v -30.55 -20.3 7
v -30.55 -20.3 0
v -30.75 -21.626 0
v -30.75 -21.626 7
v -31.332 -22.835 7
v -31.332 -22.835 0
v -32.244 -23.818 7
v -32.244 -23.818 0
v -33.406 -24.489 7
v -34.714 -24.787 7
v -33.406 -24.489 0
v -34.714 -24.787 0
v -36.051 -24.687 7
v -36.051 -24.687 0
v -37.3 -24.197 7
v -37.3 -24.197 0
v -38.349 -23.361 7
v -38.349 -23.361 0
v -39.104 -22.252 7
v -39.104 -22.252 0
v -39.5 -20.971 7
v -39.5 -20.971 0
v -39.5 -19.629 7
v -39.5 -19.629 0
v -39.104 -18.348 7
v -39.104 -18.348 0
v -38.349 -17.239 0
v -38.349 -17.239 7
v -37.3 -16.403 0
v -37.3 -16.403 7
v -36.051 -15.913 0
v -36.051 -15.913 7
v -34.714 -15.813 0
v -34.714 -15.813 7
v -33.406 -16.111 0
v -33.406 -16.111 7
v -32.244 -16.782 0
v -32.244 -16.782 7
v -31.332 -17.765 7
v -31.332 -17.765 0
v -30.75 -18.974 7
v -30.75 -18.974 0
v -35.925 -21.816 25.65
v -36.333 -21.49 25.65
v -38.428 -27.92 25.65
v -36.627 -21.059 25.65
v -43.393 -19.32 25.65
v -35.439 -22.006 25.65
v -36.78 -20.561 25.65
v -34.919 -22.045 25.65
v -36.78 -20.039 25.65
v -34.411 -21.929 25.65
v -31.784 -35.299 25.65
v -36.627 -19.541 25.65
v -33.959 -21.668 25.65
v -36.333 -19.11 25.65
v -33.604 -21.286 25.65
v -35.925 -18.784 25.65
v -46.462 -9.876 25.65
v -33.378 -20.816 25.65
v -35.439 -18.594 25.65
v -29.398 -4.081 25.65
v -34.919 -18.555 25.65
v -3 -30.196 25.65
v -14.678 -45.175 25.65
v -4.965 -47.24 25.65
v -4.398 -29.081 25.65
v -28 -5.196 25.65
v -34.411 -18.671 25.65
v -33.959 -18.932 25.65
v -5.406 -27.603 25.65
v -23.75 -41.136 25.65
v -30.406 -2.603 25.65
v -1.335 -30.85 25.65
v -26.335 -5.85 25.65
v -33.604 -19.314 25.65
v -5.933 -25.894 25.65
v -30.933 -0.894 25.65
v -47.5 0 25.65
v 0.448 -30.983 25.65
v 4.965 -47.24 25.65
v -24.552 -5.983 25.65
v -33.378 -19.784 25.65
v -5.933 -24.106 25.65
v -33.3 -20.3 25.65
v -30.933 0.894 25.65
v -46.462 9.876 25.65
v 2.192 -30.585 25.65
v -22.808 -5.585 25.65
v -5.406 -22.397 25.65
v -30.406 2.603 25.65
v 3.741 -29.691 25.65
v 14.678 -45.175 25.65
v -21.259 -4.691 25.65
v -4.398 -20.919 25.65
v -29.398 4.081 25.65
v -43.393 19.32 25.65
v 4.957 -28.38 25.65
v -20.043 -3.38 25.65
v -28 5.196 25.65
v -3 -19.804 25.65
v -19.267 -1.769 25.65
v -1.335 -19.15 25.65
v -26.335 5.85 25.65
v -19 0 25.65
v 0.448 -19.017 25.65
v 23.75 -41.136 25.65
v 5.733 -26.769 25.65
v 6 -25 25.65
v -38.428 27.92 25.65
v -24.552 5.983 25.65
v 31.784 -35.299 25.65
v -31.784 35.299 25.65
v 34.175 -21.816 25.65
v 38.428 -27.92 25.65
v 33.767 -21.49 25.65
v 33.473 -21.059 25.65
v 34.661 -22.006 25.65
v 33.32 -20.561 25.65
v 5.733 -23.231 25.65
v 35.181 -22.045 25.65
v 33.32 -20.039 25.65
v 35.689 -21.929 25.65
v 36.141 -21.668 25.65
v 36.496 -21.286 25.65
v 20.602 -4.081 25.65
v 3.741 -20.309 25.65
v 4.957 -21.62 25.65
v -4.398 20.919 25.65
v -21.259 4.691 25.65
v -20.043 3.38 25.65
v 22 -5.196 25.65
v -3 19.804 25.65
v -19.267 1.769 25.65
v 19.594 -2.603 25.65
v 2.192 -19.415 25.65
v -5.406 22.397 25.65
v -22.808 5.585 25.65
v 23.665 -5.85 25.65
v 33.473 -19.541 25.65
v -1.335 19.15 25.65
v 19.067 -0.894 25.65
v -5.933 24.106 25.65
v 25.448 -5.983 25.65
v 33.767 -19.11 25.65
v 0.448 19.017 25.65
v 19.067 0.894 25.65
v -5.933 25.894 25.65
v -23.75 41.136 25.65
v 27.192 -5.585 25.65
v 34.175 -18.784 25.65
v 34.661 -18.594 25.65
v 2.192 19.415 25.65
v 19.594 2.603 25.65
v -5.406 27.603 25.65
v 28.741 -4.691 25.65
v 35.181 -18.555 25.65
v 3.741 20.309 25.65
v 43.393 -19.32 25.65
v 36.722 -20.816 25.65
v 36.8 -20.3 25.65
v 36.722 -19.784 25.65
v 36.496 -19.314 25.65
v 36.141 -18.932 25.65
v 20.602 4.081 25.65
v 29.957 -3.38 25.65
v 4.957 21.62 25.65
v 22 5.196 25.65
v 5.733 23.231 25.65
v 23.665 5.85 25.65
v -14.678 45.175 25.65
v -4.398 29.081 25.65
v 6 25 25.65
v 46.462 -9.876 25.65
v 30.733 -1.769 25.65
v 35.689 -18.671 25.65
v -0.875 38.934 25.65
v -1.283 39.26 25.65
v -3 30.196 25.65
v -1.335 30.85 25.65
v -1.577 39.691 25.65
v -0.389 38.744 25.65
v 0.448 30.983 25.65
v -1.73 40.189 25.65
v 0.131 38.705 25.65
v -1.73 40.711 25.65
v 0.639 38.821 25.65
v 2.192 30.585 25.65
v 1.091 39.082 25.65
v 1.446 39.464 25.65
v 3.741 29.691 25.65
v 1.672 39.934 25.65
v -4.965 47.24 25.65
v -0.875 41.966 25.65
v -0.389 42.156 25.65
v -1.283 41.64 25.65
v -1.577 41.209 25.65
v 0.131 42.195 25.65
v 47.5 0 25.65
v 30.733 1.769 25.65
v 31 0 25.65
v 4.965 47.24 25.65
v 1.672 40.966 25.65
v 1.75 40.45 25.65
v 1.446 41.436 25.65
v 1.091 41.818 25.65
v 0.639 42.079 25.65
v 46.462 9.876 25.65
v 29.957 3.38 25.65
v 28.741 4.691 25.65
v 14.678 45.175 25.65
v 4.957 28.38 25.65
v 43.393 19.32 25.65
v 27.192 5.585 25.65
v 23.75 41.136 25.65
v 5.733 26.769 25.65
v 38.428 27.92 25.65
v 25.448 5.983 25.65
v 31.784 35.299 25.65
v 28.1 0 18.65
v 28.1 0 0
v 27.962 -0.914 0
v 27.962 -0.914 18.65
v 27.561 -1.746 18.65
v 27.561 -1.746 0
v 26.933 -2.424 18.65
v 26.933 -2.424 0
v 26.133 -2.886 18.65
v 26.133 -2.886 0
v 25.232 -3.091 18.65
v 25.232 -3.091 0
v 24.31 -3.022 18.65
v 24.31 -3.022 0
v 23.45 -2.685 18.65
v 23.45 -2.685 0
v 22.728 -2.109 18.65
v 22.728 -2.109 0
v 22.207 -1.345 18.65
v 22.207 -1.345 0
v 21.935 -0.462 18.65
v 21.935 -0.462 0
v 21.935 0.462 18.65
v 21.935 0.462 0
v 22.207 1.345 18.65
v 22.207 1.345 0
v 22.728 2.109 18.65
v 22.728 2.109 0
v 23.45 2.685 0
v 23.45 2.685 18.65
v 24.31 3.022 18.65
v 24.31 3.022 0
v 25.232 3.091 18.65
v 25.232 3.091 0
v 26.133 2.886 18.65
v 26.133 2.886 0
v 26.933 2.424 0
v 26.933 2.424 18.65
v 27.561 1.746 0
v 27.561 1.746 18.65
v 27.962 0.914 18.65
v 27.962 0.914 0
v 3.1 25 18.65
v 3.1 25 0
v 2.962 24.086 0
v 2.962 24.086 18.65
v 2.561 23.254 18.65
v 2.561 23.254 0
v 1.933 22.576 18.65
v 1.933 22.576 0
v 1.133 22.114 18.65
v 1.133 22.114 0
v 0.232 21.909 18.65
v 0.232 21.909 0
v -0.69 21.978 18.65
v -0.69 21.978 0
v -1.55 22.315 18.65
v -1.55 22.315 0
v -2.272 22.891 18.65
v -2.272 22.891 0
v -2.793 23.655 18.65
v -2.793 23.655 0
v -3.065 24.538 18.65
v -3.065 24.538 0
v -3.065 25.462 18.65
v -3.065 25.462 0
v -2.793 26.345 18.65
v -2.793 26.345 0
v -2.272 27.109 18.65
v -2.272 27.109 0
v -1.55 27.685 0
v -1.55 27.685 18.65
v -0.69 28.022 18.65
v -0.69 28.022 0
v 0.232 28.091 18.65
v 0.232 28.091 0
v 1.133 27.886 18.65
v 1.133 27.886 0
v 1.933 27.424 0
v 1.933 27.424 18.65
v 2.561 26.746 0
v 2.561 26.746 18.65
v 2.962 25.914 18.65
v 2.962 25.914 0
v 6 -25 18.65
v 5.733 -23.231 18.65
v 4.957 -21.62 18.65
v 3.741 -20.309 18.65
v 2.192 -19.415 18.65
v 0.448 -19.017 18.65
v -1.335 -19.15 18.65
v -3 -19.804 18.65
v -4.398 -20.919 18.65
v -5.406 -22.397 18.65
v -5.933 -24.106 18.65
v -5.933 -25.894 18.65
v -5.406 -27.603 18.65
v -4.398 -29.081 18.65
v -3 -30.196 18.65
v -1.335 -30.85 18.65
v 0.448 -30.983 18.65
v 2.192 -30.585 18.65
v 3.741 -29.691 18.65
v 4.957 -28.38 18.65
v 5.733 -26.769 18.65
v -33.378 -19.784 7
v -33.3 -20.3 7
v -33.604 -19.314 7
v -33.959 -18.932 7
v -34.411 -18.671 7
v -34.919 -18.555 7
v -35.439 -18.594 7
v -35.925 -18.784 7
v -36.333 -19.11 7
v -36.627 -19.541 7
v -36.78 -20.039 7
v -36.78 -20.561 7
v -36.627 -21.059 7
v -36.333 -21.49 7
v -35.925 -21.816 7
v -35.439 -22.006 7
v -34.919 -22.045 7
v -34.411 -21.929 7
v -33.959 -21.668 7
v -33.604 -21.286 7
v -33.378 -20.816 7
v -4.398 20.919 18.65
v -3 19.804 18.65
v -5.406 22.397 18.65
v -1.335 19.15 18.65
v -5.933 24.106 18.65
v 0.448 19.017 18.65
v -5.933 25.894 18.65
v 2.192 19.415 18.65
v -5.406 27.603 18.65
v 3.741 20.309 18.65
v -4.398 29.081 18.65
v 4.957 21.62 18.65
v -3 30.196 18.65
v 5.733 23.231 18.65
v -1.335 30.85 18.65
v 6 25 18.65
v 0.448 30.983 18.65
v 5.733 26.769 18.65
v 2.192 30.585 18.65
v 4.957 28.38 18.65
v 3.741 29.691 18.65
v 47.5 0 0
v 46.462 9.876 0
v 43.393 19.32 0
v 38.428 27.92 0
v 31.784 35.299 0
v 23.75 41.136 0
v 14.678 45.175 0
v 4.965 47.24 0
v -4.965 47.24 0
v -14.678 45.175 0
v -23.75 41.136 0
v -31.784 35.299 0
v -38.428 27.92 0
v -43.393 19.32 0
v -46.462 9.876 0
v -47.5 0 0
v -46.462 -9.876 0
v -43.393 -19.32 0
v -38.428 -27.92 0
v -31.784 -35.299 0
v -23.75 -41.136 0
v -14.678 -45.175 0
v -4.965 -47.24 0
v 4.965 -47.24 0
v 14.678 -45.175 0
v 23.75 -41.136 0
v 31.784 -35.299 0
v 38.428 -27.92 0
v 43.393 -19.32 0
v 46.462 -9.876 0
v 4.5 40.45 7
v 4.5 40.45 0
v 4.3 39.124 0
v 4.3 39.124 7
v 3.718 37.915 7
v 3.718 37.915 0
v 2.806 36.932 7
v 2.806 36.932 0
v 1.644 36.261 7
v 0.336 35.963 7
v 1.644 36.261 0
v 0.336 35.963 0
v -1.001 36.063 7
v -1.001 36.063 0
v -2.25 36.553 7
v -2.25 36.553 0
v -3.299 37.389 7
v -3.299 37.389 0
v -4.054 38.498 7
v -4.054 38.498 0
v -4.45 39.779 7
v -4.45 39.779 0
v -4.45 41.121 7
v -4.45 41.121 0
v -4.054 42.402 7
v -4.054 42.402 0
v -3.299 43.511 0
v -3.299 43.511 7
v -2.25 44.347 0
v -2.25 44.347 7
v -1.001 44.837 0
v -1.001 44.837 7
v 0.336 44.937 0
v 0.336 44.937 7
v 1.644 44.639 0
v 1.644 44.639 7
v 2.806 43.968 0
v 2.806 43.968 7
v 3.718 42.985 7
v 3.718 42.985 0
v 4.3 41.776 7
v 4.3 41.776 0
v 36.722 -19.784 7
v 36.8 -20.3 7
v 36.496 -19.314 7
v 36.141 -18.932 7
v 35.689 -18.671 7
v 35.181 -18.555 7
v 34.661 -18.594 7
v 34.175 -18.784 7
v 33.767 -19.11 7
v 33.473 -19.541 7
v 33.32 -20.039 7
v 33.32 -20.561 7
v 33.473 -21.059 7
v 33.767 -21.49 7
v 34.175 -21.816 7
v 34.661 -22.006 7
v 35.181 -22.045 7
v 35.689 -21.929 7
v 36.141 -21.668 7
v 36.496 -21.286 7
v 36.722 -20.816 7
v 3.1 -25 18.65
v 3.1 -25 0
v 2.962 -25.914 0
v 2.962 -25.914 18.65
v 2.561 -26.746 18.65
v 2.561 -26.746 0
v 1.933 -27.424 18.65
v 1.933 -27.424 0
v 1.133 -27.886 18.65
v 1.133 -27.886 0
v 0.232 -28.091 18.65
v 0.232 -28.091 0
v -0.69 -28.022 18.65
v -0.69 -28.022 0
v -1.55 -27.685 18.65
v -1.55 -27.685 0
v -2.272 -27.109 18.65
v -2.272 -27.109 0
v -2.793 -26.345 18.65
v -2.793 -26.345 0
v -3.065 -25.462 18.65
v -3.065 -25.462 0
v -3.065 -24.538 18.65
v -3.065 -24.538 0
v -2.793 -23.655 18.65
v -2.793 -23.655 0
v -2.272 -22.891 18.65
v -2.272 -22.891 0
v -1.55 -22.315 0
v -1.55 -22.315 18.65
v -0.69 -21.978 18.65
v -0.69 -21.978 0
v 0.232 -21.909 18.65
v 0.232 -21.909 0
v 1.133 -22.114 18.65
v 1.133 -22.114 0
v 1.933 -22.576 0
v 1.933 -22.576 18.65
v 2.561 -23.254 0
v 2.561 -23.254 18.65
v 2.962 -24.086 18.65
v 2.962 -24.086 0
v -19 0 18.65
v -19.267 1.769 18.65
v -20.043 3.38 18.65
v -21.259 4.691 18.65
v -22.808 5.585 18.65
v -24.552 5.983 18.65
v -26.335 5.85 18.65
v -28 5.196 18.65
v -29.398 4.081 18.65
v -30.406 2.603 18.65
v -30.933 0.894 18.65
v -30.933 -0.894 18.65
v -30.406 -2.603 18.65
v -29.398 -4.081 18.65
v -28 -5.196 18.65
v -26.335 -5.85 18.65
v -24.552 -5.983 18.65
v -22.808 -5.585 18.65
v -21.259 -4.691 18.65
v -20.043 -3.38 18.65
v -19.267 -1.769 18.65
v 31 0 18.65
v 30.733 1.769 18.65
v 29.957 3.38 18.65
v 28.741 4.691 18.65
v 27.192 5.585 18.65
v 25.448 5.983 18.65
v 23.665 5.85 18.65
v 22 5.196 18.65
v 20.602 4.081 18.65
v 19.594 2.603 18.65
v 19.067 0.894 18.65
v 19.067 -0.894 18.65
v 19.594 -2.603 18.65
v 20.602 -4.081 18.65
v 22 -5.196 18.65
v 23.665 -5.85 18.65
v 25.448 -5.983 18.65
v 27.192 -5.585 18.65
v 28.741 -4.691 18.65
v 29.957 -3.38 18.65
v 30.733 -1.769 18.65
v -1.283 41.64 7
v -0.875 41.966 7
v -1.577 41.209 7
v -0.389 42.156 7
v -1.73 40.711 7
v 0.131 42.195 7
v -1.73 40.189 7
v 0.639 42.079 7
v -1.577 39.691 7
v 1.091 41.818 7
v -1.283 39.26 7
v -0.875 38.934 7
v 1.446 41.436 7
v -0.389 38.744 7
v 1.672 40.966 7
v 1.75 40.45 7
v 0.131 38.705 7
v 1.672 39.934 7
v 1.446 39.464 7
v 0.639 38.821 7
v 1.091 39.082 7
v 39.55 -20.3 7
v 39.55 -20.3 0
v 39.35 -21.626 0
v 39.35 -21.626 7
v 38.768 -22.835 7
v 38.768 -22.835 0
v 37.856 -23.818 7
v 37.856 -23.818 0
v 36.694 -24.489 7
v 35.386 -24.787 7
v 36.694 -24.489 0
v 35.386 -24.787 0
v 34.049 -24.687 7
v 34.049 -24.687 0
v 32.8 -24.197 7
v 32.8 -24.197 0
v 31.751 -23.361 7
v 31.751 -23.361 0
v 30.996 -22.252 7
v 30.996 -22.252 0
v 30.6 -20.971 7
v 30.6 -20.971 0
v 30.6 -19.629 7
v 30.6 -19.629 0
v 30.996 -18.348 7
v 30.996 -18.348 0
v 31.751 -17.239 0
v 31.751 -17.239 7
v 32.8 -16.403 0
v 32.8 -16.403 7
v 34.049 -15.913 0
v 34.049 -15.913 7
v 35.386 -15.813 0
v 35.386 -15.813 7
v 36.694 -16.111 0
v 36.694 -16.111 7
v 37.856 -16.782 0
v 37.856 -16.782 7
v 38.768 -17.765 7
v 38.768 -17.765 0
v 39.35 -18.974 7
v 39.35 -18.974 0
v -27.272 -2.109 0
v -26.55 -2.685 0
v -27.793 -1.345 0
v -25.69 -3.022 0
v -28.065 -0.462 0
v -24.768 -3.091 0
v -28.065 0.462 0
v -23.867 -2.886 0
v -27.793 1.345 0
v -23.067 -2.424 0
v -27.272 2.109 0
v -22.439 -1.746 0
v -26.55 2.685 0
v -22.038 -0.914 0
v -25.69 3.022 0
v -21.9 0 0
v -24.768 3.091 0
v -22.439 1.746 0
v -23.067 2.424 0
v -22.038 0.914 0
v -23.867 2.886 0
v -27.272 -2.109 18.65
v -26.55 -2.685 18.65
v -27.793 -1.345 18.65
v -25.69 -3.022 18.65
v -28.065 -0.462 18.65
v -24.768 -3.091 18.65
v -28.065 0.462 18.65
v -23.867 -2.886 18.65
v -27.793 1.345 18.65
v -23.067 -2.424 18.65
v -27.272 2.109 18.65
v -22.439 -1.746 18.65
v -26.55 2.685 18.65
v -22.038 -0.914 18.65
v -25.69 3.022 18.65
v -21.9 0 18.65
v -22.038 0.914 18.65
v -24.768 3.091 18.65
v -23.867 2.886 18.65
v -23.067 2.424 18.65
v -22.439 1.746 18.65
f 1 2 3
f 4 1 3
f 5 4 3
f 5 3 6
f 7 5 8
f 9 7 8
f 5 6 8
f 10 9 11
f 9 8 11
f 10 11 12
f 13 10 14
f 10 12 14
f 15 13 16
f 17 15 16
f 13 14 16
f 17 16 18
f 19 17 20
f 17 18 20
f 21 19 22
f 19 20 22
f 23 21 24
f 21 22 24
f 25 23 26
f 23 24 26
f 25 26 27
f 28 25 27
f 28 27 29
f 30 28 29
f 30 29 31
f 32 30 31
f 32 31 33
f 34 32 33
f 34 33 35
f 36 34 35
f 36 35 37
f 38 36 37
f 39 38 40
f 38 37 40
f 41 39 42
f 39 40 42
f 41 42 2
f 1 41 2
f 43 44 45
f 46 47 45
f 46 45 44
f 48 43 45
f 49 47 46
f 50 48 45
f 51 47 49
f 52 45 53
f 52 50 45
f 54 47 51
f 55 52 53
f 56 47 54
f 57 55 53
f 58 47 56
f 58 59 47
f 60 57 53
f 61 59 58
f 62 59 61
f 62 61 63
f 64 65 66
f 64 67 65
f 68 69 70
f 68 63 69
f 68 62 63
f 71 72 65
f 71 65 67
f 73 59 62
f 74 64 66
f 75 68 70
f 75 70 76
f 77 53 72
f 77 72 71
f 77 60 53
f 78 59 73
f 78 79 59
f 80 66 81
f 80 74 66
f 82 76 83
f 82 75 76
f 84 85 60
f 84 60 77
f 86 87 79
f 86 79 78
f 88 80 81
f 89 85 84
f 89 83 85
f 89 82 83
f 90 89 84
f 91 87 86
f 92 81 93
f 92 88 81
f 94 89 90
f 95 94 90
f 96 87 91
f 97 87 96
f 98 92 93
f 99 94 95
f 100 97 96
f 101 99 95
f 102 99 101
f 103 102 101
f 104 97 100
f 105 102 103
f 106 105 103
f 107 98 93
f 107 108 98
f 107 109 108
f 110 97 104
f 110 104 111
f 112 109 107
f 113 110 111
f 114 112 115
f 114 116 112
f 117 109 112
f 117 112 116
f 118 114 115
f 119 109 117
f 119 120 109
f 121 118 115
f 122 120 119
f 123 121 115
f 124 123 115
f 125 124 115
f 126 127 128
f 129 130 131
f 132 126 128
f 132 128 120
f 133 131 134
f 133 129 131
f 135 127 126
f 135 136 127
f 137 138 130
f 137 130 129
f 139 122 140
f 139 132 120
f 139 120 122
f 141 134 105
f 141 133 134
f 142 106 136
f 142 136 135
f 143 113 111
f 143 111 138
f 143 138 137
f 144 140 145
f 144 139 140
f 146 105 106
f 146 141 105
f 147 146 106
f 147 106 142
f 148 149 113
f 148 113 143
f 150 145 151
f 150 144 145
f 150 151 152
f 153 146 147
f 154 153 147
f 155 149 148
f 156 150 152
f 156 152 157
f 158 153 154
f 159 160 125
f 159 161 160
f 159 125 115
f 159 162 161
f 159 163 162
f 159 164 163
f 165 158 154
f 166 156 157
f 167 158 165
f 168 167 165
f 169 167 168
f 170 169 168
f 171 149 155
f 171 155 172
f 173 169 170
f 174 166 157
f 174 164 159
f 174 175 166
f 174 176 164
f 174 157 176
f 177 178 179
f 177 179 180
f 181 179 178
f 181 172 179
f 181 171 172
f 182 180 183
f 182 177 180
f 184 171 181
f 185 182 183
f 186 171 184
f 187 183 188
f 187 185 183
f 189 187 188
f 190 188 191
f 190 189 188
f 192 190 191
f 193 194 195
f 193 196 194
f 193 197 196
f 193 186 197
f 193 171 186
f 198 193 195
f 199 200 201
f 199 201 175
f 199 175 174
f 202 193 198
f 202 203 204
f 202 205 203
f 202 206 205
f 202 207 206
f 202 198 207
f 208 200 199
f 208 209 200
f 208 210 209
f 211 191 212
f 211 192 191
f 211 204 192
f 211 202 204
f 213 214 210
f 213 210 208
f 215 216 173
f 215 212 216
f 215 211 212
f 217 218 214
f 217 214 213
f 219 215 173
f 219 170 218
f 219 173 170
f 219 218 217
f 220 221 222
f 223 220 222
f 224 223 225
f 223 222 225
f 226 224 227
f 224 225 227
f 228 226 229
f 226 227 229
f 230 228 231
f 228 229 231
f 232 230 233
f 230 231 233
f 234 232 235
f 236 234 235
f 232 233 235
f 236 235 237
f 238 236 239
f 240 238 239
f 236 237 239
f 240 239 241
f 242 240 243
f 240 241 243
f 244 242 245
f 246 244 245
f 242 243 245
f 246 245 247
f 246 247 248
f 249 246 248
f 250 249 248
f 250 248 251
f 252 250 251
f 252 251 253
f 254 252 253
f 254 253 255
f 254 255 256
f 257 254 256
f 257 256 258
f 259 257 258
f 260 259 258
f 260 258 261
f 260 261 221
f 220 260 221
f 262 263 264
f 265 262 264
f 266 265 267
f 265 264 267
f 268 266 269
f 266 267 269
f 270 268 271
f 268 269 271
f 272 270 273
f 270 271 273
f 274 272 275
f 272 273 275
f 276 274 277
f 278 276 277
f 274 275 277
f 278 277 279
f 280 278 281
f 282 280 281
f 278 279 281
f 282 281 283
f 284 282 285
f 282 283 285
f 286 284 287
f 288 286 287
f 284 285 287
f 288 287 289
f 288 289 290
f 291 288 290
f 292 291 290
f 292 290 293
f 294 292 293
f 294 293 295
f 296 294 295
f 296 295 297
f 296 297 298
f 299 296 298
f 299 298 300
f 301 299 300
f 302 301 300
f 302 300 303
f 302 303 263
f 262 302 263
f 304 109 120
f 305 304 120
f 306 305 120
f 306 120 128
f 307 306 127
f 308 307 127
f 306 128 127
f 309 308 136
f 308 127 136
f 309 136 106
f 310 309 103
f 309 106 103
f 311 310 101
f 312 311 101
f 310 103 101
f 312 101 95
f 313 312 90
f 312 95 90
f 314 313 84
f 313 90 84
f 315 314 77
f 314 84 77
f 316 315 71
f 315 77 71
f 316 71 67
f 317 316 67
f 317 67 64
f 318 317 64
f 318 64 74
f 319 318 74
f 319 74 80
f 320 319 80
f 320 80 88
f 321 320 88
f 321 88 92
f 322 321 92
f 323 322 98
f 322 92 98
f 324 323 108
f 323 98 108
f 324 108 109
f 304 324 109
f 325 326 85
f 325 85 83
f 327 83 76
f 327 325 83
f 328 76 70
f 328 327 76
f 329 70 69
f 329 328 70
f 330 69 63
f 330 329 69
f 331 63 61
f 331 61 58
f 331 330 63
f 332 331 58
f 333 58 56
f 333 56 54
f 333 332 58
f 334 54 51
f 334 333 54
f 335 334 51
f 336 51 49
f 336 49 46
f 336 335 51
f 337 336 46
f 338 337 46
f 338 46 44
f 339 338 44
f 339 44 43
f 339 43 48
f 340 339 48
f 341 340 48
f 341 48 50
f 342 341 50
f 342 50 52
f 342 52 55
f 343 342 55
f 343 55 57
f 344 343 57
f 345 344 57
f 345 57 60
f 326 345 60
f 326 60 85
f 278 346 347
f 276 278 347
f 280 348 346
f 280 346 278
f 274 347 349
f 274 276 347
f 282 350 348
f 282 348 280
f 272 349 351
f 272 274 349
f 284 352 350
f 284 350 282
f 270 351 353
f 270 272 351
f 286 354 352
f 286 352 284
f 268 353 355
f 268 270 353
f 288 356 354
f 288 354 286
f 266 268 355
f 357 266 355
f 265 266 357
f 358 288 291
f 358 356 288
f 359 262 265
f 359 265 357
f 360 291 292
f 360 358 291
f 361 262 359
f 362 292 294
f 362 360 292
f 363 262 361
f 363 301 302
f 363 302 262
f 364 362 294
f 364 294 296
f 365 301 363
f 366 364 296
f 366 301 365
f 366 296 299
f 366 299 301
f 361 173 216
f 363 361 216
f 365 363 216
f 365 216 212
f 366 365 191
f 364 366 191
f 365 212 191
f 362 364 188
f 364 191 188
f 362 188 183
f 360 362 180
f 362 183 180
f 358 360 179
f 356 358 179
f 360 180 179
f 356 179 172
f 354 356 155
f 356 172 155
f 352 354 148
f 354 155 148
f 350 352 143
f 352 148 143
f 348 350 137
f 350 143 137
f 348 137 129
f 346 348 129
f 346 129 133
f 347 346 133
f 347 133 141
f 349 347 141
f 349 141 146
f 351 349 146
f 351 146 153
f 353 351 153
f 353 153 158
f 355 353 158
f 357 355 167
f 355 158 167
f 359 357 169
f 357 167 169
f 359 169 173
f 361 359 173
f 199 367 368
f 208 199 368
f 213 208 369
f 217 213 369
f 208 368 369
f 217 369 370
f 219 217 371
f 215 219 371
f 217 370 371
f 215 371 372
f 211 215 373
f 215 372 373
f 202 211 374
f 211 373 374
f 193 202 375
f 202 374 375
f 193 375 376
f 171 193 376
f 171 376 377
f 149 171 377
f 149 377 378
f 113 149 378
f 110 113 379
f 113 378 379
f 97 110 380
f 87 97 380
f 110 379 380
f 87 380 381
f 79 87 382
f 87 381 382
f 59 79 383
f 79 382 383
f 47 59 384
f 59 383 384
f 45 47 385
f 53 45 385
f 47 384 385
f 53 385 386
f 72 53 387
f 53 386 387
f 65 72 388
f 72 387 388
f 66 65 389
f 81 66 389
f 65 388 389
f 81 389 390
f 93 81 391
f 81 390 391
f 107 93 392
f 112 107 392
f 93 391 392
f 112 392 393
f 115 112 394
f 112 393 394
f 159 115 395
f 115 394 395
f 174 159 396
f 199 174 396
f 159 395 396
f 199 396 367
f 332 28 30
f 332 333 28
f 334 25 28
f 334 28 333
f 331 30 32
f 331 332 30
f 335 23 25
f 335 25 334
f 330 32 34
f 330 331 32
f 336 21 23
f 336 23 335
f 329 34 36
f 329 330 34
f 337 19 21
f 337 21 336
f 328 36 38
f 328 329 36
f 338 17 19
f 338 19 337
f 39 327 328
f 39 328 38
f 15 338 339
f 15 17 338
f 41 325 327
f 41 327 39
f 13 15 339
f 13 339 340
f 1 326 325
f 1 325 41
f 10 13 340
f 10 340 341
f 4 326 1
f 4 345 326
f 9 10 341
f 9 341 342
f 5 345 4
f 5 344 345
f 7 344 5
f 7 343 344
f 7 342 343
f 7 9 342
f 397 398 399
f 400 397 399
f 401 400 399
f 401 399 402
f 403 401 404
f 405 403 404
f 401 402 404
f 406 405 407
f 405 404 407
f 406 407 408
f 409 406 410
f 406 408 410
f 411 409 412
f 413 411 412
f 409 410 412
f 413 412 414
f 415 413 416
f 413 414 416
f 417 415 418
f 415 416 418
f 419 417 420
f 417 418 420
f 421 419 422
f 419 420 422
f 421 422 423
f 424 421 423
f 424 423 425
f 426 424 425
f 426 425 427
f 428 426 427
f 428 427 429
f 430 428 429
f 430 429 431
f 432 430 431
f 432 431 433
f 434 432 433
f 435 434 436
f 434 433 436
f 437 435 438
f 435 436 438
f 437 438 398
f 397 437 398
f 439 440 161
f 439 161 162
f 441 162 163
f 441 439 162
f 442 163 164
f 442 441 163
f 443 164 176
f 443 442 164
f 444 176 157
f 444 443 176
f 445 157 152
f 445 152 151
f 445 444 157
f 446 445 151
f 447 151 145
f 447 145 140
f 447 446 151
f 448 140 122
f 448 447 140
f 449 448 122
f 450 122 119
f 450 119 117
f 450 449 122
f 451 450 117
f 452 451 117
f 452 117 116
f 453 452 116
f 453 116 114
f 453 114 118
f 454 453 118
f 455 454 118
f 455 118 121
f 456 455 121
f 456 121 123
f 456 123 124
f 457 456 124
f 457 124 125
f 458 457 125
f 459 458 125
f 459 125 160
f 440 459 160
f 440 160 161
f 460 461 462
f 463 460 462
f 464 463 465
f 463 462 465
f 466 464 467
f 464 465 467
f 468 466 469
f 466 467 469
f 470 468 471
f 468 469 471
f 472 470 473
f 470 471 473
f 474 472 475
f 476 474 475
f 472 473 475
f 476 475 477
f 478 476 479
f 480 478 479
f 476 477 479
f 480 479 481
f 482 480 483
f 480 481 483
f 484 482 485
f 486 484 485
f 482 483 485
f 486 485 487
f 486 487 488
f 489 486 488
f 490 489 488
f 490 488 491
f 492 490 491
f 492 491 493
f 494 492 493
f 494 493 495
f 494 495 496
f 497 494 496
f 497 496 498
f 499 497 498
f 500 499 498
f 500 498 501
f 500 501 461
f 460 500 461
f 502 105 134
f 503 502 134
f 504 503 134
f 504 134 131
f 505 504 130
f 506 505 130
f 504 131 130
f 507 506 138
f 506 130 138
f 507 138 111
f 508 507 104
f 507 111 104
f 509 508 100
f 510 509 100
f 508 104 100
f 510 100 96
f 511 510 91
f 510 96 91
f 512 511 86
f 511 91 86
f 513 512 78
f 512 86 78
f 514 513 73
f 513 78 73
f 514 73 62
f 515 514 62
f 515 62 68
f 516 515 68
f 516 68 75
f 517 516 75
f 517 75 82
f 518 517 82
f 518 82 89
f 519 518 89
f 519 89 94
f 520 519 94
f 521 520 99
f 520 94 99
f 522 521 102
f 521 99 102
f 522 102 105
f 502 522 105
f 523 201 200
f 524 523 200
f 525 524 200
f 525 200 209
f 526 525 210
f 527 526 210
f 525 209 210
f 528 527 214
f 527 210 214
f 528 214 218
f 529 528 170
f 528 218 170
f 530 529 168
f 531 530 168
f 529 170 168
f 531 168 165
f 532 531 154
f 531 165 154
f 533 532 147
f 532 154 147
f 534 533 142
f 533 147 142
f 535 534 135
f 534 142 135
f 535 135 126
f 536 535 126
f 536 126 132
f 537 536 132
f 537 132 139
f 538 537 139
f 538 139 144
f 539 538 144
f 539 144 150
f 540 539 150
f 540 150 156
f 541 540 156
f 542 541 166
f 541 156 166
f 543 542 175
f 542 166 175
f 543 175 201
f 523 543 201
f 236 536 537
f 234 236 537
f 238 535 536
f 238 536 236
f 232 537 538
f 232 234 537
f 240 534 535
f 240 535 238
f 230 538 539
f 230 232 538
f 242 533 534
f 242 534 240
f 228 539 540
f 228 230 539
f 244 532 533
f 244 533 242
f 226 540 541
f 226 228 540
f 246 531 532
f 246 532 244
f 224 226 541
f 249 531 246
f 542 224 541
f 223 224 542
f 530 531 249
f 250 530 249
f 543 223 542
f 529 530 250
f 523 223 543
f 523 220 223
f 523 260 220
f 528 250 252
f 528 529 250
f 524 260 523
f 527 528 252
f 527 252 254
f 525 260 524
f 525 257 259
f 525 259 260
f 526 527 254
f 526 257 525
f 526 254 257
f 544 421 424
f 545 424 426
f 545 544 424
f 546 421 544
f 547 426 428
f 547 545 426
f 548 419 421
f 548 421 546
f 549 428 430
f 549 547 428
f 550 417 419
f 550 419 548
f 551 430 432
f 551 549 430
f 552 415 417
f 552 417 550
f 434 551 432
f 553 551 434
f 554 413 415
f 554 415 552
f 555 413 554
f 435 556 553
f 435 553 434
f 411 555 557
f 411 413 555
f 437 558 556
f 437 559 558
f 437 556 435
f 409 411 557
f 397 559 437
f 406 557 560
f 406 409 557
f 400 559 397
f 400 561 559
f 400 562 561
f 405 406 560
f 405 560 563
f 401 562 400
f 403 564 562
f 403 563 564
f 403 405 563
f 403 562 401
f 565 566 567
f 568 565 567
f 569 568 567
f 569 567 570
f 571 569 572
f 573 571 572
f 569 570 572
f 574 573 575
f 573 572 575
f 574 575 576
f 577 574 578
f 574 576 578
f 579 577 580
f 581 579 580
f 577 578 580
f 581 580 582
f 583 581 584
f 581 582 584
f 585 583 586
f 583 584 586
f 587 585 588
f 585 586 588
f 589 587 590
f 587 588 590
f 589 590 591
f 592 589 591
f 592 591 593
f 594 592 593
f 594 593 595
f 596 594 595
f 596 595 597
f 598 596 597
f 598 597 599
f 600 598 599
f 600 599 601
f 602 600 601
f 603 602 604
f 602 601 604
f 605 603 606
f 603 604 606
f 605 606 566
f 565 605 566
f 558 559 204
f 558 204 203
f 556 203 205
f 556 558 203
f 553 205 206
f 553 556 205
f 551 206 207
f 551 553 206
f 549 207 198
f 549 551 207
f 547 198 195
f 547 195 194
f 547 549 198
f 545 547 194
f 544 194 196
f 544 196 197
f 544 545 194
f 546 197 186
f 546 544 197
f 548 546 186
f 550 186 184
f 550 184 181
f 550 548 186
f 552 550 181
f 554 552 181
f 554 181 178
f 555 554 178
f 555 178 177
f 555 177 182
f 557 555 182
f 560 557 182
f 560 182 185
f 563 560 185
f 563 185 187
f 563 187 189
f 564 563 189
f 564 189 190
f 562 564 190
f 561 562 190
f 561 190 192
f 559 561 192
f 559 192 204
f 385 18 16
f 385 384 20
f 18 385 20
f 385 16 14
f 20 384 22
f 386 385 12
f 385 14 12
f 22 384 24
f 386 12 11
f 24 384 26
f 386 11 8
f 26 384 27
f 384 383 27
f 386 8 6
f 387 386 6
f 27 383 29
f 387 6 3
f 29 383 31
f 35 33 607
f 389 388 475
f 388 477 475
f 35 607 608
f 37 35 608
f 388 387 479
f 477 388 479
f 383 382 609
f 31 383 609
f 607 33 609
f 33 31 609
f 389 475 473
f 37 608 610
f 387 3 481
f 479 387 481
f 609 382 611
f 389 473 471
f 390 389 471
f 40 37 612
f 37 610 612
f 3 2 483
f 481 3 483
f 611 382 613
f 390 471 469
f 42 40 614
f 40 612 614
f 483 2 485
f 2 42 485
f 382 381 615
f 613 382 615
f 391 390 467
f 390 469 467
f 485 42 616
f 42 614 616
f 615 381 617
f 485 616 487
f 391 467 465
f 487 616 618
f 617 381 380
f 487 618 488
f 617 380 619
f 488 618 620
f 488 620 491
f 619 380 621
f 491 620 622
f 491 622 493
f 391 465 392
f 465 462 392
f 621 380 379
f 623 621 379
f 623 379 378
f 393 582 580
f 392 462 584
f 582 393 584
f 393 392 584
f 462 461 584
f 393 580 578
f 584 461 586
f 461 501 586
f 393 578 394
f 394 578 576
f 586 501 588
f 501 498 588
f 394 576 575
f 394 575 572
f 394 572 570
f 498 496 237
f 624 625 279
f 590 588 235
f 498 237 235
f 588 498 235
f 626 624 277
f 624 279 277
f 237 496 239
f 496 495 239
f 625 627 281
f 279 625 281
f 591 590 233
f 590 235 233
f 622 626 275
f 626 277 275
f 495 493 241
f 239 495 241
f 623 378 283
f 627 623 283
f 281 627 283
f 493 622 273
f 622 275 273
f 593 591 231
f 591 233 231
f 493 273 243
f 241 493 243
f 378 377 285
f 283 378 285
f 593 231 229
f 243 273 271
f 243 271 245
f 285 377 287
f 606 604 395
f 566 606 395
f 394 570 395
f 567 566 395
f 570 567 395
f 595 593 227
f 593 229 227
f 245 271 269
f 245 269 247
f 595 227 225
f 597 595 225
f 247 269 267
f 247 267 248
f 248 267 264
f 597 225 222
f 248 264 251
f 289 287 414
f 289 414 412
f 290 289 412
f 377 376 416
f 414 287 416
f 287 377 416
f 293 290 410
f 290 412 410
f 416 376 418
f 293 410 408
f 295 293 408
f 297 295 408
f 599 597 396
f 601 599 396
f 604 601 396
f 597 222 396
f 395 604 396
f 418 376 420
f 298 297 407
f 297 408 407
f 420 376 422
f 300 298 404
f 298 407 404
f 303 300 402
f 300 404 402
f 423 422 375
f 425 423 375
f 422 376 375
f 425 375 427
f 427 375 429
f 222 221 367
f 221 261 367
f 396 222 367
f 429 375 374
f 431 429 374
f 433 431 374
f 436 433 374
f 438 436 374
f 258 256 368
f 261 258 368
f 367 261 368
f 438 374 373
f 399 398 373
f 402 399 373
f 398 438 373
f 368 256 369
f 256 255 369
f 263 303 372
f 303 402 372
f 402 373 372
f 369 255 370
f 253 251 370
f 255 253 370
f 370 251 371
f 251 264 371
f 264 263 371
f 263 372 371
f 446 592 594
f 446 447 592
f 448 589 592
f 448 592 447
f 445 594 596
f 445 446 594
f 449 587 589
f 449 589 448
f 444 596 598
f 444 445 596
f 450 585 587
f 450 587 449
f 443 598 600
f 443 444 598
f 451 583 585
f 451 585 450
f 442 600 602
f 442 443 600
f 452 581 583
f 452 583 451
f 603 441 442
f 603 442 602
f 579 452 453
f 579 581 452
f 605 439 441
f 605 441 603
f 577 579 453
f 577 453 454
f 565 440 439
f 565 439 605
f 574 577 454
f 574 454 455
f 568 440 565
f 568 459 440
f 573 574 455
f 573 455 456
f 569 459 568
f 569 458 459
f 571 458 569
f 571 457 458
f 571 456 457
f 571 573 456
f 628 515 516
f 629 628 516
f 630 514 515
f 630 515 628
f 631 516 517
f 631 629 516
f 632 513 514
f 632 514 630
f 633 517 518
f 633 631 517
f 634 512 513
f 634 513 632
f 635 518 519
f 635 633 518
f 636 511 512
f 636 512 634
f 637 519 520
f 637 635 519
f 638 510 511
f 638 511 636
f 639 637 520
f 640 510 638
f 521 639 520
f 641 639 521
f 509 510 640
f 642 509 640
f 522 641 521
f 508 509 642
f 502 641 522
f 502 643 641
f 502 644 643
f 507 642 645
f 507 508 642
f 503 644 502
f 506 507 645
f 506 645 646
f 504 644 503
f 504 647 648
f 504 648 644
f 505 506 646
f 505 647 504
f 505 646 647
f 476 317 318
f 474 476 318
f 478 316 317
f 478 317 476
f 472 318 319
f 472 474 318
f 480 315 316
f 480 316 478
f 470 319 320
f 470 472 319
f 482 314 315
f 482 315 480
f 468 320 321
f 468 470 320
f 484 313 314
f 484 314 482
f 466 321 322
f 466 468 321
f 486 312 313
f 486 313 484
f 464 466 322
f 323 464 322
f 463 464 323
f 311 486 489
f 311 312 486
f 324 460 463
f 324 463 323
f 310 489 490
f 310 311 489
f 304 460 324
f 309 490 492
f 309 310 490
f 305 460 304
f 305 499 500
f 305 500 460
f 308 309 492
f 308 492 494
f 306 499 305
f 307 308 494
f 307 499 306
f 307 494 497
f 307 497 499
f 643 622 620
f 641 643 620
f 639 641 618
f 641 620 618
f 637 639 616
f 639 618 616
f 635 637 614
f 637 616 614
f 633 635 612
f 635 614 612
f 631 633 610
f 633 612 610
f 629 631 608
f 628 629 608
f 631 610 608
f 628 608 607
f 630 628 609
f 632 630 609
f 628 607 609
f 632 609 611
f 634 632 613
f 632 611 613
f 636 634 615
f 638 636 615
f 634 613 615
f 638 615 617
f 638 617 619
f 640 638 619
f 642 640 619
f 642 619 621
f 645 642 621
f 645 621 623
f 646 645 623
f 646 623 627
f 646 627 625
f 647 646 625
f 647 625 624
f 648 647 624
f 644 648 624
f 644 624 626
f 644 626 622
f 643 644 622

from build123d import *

# Parameters (mm, degrees)
SKETCH_R        = 47.5
SKETCH_R_2      = 1.75
PAD_DEPTH       = 25.65
SKETCH001_R     = 4.5
POCKET_DEPTH    = 7
SKETCH002_R     = 3.1
POCKET001_DEPTH = 25.651
SKETCH003_R     = 6
POCKET002_DEPTH = 7


with BuildPart() as part:
    # Sketch → Pad (new body)
    with BuildSketch(Plane.XY):
        Circle(SKETCH_R)
        with Locations((0, 40.45)):
            Circle(SKETCH_R_2, mode=Mode.SUBTRACT)
        with Locations((-35.05, -20.3)):
            Circle(SKETCH_R_2, mode=Mode.SUBTRACT)
        with Locations((35.05, -20.3)):
            Circle(SKETCH_R_2, mode=Mode.SUBTRACT)
    extrude(amount=PAD_DEPTH)

    # Sketch001 (on Face5 of Pad) → Pocket (cut)
    with BuildSketch(Plane(origin=(0, 0, 0), x_dir=(1, 0, 0), z_dir=(0, 0, -1))):
        with Locations((-35.05, 20.3)):
            Circle(SKETCH001_R)
        with Locations((35.05, 20.3)):
            Circle(SKETCH001_R)
        with Locations((0, -40.45)):
            Circle(SKETCH001_R)
    extrude(amount=-POCKET_DEPTH, mode=Mode.SUBTRACT)

    # Sketch002 (on Face2 of Pocket) → Pocket001 (cut, through all)
    with BuildSketch(Plane(origin=(0, 0, 0), x_dir=(1, 0, 0), z_dir=(0, 0, -1))):
        with Locations((0, 25)):
            Circle(SKETCH002_R)
        with Locations((25, 0)):
            Circle(SKETCH002_R)
        with Locations((-25, 0)):
            Circle(SKETCH002_R)
        with Locations((0, -25)):
            Circle(SKETCH002_R)
    extrude(amount=-POCKET001_DEPTH, mode=Mode.SUBTRACT)

    # Sketch003 (on Face3 of Pocket001) → Pocket002 (cut)
    with BuildSketch(Plane.XY.offset(25.65)):
        with Locations((0, 25)):
            Circle(SKETCH003_R)
        with Locations((0, -25)):
            Circle(SKETCH003_R)
        with Locations((25, 0)):
            Circle(SKETCH003_R)
        with Locations((-25, 0)):
            Circle(SKETCH003_R)
    extrude(amount=-POCKET002_DEPTH, mode=Mode.SUBTRACT)


solid = part.part
